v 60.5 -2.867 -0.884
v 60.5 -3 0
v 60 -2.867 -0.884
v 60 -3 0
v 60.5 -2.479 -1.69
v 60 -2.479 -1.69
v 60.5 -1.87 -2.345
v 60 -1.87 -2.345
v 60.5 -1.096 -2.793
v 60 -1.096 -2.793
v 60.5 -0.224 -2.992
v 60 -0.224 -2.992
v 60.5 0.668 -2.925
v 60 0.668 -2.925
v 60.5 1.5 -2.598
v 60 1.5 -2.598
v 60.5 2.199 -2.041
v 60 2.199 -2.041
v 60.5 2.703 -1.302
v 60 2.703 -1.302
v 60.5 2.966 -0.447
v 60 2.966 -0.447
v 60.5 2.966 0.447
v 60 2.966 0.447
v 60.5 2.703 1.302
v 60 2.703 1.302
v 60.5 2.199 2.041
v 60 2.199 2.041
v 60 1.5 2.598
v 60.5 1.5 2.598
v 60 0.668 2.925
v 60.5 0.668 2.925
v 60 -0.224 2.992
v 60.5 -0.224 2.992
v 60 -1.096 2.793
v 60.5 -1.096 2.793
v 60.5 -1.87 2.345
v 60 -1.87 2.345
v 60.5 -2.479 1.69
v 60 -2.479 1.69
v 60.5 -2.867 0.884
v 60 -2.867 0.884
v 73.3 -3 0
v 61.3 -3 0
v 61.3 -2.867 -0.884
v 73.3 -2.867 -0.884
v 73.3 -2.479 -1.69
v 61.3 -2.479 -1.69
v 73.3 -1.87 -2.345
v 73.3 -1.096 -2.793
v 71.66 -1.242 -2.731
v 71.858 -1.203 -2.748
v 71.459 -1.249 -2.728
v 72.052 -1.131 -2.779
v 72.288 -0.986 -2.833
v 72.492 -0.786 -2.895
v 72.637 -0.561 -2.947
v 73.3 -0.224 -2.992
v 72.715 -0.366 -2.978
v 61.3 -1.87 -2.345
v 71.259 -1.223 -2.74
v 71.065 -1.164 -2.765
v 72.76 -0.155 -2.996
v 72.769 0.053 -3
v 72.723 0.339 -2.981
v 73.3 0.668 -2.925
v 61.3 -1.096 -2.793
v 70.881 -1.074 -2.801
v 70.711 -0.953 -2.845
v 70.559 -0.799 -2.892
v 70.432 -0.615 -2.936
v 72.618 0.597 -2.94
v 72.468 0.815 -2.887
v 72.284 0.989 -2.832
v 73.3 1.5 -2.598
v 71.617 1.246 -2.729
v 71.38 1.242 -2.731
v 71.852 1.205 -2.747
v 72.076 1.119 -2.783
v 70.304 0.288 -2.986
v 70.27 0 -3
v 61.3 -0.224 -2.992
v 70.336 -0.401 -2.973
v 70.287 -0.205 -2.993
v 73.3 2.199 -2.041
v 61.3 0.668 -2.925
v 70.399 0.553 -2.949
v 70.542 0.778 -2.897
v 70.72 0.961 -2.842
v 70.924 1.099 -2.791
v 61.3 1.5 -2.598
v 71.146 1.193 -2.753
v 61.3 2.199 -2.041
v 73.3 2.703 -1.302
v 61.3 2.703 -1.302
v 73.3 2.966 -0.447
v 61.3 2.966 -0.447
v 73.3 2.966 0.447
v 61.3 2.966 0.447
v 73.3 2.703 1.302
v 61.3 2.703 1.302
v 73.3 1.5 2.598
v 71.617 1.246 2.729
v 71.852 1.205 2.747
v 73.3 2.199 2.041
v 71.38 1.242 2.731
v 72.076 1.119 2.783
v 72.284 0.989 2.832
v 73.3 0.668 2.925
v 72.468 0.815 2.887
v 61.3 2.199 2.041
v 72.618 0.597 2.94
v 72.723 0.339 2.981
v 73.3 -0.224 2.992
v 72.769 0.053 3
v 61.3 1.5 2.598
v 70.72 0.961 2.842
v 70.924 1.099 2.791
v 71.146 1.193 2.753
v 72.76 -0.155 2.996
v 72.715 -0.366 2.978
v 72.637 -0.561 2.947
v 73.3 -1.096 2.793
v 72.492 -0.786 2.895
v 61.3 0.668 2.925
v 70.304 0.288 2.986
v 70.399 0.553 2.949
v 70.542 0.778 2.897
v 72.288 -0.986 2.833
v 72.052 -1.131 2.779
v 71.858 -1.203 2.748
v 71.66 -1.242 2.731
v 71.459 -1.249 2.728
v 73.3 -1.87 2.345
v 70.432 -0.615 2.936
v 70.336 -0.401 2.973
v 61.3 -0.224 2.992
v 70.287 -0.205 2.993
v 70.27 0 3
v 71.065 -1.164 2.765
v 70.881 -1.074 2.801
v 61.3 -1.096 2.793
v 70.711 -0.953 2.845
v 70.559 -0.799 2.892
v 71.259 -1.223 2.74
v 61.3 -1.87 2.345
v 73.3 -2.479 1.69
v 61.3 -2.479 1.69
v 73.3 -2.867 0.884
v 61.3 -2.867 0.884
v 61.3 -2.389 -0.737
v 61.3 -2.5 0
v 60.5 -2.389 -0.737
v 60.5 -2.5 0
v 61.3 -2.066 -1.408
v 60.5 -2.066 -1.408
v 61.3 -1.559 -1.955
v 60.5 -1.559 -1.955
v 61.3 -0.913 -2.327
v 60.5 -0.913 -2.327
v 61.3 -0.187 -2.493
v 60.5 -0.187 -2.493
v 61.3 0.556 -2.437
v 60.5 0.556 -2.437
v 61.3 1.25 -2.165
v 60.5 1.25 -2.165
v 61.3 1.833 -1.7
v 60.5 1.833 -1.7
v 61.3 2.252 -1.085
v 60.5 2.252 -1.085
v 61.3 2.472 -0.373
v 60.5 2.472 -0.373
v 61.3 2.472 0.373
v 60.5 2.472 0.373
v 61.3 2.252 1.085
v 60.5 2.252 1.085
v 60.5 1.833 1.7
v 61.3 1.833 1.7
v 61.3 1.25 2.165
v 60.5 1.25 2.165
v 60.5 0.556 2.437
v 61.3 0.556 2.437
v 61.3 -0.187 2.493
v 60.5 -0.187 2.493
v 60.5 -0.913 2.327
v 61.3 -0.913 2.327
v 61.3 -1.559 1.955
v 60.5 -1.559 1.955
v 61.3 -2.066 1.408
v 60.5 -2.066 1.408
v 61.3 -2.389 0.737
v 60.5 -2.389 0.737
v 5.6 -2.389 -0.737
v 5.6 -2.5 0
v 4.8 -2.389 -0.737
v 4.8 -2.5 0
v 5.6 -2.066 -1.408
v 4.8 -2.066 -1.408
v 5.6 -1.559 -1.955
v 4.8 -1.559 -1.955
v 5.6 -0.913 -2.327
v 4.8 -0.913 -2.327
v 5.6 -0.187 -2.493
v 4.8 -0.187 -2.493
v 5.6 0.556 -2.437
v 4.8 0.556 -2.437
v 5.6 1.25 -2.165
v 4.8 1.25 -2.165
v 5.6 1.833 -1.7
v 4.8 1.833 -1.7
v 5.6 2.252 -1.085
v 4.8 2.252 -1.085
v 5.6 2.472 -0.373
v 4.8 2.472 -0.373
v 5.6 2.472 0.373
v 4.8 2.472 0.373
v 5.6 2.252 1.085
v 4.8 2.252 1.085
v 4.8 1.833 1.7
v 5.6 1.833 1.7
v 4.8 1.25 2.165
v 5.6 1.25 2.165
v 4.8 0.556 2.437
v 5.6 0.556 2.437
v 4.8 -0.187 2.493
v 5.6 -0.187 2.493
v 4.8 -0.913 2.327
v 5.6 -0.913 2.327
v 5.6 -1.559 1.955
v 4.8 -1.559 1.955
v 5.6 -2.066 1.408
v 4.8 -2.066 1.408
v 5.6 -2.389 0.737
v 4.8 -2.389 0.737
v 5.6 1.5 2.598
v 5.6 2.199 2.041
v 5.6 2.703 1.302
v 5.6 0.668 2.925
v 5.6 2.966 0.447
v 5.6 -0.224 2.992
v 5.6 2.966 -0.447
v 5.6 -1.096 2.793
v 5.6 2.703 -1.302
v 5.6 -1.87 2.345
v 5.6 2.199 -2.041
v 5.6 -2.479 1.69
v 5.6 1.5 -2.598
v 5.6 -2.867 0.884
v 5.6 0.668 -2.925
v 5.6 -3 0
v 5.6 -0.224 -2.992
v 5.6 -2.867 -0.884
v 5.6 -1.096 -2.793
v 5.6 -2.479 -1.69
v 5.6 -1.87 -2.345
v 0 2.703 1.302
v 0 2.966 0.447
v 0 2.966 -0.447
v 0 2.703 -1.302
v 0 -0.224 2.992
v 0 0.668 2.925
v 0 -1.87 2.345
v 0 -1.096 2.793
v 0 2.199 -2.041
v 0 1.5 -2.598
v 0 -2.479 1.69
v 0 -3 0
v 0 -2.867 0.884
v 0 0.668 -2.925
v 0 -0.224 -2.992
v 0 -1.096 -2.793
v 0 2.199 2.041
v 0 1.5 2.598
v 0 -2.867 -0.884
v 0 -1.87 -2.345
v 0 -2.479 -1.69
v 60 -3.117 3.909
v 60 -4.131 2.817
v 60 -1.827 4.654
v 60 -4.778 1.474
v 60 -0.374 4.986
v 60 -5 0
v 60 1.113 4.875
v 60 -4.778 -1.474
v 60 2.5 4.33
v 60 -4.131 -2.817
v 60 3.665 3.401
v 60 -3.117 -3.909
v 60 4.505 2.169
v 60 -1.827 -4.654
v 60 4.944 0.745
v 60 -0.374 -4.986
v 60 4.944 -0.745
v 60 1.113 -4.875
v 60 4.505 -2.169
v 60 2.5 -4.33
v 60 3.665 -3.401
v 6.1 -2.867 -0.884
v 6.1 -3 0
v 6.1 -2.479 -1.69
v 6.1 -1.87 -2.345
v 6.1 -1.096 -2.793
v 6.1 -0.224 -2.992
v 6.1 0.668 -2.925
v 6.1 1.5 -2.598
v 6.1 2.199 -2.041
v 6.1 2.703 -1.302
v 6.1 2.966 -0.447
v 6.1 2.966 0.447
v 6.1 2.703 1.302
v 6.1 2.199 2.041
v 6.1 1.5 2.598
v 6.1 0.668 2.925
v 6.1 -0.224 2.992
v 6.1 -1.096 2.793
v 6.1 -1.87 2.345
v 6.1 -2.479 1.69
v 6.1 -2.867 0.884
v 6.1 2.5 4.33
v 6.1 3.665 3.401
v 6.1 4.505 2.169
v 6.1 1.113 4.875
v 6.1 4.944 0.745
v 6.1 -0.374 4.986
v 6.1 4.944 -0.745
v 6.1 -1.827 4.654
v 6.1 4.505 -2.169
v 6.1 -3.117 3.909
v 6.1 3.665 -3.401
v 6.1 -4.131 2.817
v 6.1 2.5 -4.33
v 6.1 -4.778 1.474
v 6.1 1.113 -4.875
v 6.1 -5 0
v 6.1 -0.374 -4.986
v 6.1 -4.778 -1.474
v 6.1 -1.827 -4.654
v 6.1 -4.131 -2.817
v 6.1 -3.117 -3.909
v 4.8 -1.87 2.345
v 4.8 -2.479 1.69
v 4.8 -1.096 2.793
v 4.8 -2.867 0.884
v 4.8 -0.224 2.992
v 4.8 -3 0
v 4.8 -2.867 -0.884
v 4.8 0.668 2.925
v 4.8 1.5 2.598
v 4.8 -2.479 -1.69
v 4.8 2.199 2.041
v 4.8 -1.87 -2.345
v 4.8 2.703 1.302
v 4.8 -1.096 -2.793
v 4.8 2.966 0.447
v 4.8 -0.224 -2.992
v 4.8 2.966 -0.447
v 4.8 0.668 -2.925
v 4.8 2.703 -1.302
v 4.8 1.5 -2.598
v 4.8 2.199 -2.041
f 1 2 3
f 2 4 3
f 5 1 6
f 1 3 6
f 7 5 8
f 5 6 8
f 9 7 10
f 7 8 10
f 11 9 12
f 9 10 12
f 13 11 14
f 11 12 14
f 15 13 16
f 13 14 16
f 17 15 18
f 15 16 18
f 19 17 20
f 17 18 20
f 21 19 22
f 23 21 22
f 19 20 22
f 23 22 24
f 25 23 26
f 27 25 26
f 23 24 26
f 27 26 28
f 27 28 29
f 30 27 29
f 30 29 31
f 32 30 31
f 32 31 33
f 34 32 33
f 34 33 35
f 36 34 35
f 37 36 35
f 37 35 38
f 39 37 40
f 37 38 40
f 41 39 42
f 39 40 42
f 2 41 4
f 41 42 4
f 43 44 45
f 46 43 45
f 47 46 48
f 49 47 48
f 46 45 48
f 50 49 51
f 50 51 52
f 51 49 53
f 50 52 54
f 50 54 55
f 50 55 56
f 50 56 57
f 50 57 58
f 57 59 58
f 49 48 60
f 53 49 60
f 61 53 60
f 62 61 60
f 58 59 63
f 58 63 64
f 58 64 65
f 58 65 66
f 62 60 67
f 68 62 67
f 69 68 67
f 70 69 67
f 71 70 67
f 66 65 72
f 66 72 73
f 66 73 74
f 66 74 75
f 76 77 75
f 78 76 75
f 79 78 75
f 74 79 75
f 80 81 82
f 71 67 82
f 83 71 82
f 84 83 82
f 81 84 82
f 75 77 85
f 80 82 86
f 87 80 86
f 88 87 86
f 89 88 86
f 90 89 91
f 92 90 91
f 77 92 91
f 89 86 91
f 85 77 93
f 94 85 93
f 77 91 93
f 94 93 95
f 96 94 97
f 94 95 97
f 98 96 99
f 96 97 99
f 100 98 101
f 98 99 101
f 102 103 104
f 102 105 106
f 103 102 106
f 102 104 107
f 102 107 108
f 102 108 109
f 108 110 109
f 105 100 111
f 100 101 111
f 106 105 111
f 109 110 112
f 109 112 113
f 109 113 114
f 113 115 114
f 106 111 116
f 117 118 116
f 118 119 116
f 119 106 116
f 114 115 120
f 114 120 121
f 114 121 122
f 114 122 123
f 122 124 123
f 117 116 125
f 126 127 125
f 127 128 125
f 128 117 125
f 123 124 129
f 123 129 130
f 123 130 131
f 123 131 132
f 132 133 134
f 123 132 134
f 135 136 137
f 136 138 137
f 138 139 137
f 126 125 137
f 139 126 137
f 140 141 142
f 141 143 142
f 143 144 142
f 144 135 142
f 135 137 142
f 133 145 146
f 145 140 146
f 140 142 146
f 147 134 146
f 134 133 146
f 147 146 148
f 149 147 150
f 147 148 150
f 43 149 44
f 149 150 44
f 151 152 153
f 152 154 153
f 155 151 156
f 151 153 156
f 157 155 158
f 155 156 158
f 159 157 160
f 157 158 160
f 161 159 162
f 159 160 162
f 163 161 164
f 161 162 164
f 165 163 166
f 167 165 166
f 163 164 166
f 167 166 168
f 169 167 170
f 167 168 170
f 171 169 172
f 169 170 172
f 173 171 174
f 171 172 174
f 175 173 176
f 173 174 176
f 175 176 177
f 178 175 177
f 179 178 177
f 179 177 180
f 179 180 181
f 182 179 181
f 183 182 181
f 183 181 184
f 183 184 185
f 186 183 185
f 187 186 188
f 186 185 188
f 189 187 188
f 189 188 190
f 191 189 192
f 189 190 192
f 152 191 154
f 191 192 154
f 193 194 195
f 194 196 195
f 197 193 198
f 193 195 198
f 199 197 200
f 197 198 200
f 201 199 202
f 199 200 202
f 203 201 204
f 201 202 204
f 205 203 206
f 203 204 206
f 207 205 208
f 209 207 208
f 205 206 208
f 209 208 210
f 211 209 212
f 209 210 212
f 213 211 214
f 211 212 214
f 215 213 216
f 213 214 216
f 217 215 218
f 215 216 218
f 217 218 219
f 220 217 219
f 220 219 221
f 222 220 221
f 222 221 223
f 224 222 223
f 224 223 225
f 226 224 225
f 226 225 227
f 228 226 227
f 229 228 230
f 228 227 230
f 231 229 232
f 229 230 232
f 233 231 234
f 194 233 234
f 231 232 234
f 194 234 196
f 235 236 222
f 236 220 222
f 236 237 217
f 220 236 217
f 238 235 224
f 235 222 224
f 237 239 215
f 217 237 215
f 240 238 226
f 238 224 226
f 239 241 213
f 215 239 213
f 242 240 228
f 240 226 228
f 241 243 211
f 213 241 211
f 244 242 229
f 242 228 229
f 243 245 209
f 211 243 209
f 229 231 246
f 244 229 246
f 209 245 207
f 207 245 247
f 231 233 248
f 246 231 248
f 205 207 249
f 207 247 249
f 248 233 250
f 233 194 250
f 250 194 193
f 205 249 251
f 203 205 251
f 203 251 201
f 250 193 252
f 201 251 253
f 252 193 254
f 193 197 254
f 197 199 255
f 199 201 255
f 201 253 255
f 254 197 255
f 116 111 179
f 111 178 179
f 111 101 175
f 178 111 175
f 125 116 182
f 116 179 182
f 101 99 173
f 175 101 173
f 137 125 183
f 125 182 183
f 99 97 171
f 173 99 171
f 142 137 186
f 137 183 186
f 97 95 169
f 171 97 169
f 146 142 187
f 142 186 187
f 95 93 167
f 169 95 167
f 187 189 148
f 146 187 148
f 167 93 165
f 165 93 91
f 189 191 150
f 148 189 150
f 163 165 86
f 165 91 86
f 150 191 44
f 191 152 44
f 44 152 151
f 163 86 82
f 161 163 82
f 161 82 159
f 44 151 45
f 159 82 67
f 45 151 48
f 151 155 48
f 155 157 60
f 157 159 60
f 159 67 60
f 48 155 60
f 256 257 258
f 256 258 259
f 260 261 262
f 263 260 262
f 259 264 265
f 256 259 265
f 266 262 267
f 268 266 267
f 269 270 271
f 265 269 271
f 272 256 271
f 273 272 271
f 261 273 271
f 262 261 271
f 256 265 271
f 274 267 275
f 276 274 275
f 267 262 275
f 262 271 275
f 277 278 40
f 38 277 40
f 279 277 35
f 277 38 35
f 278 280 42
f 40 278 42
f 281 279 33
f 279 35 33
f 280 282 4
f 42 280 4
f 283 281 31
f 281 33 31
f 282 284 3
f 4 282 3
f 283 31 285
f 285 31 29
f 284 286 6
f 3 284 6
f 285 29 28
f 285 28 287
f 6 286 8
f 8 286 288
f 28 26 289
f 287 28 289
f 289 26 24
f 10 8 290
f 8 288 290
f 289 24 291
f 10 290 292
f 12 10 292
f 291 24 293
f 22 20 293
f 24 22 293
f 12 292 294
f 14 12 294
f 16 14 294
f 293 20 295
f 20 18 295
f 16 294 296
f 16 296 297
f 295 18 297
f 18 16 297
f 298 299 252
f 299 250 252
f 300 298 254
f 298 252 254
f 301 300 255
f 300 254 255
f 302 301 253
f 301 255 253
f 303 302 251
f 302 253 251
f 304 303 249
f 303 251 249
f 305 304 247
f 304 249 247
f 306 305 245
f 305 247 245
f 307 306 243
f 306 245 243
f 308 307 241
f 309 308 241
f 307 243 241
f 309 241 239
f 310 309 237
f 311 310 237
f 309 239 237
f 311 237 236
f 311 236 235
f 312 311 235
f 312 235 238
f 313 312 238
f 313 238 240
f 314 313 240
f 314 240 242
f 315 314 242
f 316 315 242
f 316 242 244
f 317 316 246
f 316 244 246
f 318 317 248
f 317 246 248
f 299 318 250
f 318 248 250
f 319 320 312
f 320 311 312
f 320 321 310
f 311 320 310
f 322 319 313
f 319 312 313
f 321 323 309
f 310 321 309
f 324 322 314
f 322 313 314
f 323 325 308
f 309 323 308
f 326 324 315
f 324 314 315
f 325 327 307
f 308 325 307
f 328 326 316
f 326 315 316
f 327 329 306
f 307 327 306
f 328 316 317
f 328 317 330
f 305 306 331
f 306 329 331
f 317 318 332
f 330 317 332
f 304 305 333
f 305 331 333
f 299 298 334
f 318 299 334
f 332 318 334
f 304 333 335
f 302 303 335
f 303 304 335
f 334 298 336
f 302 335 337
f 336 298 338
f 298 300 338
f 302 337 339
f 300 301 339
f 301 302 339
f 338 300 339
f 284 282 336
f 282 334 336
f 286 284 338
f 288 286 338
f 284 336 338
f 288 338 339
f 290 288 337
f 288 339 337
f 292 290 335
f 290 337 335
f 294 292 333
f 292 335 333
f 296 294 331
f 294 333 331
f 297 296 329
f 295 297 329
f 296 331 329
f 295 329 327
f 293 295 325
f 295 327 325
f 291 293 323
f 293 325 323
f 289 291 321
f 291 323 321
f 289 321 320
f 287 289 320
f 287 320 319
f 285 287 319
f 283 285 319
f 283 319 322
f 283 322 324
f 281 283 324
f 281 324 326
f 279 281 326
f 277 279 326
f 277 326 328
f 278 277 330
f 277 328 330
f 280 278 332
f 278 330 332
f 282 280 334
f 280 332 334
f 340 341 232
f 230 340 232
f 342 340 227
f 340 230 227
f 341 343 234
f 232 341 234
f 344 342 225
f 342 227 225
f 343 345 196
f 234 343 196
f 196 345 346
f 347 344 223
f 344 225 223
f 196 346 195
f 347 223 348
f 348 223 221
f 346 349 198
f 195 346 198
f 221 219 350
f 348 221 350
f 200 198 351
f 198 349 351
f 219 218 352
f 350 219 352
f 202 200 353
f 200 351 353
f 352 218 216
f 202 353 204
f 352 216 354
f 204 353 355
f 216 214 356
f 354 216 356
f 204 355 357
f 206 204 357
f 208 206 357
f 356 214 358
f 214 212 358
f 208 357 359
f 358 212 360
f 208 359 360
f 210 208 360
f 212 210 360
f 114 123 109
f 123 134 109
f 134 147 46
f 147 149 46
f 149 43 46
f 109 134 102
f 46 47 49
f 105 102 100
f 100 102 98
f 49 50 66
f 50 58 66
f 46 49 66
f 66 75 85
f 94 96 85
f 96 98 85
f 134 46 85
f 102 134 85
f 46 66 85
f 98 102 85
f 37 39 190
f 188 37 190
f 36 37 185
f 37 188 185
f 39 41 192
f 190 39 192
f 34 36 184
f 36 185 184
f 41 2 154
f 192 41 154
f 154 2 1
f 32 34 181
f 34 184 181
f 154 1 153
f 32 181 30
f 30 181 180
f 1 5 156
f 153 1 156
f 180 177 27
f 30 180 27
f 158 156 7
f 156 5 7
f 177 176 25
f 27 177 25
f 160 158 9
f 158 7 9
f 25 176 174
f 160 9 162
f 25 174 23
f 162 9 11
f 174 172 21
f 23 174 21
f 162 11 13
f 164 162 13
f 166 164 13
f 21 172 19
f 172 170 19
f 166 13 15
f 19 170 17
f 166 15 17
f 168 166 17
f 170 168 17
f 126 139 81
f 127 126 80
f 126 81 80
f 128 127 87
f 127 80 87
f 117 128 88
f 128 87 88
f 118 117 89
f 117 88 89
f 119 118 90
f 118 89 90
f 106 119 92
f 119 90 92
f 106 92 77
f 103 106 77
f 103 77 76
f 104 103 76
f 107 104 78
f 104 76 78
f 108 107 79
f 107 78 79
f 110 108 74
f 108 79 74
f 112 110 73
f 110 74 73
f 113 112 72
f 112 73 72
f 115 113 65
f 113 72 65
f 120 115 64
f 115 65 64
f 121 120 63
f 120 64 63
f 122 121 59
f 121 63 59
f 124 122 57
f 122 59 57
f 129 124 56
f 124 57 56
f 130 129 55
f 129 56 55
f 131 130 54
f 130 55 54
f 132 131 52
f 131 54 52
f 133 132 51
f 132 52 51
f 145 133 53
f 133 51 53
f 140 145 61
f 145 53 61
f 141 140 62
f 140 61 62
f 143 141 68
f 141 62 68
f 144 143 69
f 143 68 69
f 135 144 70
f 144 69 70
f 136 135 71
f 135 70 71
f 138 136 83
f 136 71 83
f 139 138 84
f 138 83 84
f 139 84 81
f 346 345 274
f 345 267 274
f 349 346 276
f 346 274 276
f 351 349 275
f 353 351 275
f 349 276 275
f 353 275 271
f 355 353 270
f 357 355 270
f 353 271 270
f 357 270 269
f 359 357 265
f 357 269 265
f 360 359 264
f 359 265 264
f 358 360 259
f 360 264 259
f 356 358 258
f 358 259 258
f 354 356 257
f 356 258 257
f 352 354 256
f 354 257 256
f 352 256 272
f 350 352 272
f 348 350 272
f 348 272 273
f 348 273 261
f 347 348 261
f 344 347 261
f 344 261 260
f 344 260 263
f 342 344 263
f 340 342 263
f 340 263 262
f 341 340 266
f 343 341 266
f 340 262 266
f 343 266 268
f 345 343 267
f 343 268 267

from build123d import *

# Parameters (mm, degrees)
SKETCH4_R          = 1.25
CUT_EXTRUDE1_DEPTH = 5


with BuildPart() as part:
    # Sketch1 → Revolve1 (revolve)
    with BuildSketch(Plane.XY, mode=Mode.PRIVATE) as revolve1_sk:
        Polygon((0, 0), (73.3, 0), (73.3, 3), (61.3, 3), (61.3, 2.5), (60.5, 2.5), (60.5, 3), (60, 3), (60, 5), (6.1, 5), (6.1, 3), (5.6, 3), (5.6, 2.5), (4.8, 2.5), (4.8, 3), (0, 3), align=None)
    revolve(revolve1_sk.sketch.rotate(Axis((0, 0, 0), (1, 0, 0)), 180), axis=Axis((0, 0, 0), (1, 0, 0)))

    # Sketch4 → Cut-Extrude1 (cut, symmetric)
    with BuildSketch(Plane(origin=(0, 0, 0), x_dir=(-1, 0, 0), z_dir=(0, 0, -1))):
        with Locations((-71.52, 0)):
            Circle(SKETCH4_R)
    extrude(amount=CUT_EXTRUDE1_DEPTH, both=True, mode=Mode.SUBTRACT)


solid = part.part
